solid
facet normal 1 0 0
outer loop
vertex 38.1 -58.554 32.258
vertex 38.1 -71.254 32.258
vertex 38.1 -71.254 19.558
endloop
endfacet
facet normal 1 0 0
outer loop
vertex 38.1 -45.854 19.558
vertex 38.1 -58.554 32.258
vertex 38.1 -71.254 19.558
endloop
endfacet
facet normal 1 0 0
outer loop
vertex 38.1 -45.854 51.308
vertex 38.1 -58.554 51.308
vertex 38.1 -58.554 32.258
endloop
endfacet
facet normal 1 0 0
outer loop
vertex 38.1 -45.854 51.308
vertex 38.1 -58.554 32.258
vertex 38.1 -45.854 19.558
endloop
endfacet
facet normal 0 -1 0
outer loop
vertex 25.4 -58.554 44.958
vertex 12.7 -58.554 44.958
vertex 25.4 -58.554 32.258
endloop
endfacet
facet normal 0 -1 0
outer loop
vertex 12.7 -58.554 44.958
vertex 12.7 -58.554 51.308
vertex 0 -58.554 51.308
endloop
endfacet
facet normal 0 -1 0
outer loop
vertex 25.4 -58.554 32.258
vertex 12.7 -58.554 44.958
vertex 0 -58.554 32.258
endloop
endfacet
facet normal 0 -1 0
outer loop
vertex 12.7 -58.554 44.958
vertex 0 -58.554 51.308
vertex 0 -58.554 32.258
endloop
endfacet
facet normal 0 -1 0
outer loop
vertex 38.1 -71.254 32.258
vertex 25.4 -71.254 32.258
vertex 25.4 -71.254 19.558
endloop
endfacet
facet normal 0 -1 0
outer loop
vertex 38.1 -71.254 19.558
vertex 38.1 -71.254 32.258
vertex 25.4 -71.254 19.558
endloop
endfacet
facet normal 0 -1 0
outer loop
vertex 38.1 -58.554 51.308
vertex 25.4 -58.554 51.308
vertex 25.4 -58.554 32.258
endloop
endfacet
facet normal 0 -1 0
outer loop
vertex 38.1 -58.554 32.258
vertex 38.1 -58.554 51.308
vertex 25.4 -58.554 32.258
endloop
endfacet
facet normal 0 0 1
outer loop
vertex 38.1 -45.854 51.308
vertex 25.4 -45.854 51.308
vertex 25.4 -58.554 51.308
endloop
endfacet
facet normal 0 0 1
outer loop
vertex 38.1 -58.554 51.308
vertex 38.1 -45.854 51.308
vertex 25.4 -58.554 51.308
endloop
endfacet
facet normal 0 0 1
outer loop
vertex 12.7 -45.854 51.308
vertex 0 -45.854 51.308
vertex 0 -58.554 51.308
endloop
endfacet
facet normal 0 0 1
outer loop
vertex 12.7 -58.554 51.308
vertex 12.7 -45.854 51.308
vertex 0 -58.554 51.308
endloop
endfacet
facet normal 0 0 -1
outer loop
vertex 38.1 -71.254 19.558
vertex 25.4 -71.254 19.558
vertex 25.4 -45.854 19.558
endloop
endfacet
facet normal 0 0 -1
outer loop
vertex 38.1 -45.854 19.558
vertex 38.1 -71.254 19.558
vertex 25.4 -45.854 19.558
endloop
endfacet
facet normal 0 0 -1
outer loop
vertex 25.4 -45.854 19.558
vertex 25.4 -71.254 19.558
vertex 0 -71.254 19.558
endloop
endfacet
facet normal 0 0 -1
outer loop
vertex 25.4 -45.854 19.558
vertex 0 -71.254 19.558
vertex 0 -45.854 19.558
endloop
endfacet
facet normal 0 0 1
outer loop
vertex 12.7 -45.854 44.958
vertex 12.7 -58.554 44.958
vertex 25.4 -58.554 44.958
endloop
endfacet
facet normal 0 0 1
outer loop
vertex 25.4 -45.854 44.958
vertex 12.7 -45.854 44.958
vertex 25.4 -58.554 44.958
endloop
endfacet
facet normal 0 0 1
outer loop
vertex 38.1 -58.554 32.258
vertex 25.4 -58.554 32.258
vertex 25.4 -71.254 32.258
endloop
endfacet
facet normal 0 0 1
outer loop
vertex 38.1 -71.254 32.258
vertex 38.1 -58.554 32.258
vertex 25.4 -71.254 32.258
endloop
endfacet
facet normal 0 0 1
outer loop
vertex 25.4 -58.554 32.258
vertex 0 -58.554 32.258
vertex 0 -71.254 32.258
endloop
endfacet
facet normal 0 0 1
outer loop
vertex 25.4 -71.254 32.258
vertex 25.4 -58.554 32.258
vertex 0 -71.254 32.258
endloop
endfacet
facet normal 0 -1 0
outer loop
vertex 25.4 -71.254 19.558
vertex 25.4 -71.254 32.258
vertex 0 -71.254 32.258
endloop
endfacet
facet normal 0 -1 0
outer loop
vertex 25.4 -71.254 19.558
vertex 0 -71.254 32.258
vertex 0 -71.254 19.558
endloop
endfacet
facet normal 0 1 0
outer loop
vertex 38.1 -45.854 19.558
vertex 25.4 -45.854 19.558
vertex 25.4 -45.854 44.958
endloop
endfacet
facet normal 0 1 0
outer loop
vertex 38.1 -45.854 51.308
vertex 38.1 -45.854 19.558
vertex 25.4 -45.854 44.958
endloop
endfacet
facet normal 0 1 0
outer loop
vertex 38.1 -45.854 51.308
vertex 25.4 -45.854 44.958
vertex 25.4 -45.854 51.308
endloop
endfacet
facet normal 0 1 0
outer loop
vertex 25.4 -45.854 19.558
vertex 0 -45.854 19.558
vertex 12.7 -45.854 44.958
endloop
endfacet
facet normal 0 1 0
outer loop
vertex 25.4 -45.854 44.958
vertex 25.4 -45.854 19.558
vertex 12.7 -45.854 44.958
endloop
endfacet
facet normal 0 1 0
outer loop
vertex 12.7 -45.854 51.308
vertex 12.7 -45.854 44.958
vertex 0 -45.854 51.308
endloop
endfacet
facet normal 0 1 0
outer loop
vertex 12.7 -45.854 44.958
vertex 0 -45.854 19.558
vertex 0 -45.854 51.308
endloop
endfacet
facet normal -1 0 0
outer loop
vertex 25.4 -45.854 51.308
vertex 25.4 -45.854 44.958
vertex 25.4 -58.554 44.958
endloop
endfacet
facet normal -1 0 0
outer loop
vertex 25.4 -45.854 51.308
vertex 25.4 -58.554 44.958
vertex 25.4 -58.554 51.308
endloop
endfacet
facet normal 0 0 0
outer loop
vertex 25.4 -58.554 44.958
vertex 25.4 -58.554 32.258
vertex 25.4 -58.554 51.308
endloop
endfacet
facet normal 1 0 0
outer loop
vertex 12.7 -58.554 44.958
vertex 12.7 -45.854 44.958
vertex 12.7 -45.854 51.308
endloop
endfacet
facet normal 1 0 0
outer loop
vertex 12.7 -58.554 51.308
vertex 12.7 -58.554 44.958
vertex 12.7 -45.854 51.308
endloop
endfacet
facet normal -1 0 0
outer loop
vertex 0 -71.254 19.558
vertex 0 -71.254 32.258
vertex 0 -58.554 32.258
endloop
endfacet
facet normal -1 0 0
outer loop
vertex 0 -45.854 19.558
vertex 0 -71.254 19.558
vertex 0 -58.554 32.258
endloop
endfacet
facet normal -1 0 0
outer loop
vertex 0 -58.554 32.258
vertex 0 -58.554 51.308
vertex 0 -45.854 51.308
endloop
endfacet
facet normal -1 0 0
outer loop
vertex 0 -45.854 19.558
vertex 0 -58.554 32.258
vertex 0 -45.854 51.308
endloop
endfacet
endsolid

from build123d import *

# Parameters (mm, degrees)
F1_DEPTH = 25.4
F2_DEPTH = 12.7
F3_W     = 12.7
F3_H     = 6.35
F4_DEPTH = 12.701


with BuildPart() as f1:
    # F0 (on Right) → F1 (new body)
    with BuildSketch(Plane.YZ):
        Polygon((-45.853703, 51.307991), (-58.553703, 51.307991), (-58.553703, 32.257991), (-71.253703, 32.257991), (-71.253703, 19.557991), (-45.853703, 19.557991), align=None)
    extrude(amount=F1_DEPTH)

    # F1_face (on face) → F2 (join)
    with BuildSketch(Plane(origin=(25.4, -55.832275, 32.711562), x_dir=(0, 1, 0), z_dir=(1, 0, 0))):
        Polygon((9.978571, 18.596429), (-2.721429, 18.596429), (-2.721429, -0.453571), (-15.421429, -0.453571), (-15.421429, -13.153571), (9.978571, -13.153571), align=None)
    extrude(amount=F2_DEPTH)

    # F3 (on face) → F4 (cut, through all)
    with BuildSketch(Plane.XZ.offset(58.553703)):
        with Locations((19.05, 48.132991)):
            Rectangle(F3_W, F3_H)
    extrude(amount=-F4_DEPTH, mode=Mode.SUBTRACT)


solid = f1.part
